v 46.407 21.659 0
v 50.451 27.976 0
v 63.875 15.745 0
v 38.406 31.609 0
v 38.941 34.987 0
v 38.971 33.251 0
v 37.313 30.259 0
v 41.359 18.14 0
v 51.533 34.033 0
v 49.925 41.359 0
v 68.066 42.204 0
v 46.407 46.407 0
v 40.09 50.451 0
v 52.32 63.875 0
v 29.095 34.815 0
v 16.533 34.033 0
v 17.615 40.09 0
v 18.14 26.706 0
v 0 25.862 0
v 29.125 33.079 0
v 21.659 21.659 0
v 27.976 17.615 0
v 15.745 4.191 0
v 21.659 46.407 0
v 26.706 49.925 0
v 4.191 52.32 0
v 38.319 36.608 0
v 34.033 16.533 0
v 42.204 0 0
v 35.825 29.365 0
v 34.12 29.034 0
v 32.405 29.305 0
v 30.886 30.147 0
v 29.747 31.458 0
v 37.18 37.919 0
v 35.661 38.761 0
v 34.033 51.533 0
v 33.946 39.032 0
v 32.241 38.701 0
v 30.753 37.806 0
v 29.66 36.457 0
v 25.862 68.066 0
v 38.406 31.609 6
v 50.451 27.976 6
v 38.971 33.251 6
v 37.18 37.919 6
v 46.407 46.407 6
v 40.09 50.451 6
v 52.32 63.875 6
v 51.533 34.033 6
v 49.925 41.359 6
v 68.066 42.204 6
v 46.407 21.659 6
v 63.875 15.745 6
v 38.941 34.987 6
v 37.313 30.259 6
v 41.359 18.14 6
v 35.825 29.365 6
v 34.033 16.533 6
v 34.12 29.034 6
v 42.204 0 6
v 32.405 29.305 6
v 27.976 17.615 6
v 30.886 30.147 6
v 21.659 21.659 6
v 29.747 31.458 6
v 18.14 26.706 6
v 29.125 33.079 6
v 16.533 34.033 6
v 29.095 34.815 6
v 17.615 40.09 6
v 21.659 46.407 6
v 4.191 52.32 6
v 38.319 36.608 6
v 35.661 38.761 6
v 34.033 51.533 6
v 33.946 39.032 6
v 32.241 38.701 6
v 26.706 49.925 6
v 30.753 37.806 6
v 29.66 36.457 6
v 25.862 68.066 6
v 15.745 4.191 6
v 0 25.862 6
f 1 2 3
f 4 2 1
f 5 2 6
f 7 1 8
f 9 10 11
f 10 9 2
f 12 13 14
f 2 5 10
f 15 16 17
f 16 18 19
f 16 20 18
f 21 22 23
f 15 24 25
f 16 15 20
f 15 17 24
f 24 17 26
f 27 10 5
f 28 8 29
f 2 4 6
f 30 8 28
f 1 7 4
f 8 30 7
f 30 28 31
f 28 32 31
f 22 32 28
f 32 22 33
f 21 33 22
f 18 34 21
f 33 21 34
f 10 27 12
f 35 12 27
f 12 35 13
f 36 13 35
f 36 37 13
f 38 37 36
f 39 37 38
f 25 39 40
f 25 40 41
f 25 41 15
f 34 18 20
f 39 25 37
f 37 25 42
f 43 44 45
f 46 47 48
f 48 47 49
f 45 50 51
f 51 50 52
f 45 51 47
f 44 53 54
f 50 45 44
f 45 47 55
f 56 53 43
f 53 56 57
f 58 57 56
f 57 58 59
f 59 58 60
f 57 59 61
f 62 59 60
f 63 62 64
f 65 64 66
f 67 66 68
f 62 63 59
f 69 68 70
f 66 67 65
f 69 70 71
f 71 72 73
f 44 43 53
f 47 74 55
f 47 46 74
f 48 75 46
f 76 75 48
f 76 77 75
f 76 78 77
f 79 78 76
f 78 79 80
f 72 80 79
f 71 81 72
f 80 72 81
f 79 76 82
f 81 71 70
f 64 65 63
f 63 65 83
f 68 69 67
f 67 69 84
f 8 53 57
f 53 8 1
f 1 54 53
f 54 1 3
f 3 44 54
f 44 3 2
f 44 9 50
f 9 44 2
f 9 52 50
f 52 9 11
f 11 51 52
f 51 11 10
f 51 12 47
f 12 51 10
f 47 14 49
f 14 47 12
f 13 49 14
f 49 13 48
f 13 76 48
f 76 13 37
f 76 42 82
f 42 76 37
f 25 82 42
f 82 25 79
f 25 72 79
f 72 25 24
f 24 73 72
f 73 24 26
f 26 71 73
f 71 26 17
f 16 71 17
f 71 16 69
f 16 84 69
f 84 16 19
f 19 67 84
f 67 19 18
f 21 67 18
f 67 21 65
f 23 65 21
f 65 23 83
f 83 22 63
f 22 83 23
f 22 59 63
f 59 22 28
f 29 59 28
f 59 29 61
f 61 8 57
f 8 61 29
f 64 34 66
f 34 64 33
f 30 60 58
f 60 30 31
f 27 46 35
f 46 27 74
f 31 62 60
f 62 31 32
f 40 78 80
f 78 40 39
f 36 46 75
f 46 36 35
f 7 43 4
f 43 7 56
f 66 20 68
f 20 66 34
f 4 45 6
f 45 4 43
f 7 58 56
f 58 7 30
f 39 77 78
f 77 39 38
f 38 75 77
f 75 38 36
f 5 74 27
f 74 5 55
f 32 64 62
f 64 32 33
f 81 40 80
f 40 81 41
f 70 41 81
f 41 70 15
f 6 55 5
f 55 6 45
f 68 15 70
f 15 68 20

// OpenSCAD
$fn = 32;

// ----------------------------------------------------------------------
// Star wheel: 8-point ratchet, R35
// ----------------------------------------------------------------------

// --- parameters (mm) ---
n_points = 8;             // number of points / teeth
r_out = 35;               // tip radius
r_in = 17.5;              // root radius
bore_r = 5;               // centre bore radius
plate_t = 6;              // plate thickness, Z (extrusion height)
bore_d = 10;              // centre bore diameter

profile = [[34.033, 51.533], [25.862, 68.066], [26.706, 49.925], [21.659, 46.407], [4.191, 52.32], [17.615, 40.09], [16.533, 34.033], [0, 25.862], [18.14, 26.706], [21.659, 21.659], [15.745, 4.191], [27.976, 17.615], [34.033, 16.533], [42.204, 0], [41.359, 18.14], [46.407, 21.659], [63.875, 15.745], [50.451, 27.976], [51.533, 34.033], [68.066, 42.204], [49.925, 41.359], [46.407, 46.407], [52.32, 63.875], [40.09, 50.451]];  // primary outline, 24 points, counter clockwise
void_1 = [[38.941, 34.987], [38.319, 36.608], [37.18, 37.919], [35.661, 38.761], [33.946, 39.032], [32.241, 38.701], [30.753, 37.806], [29.66, 36.457], [29.095, 34.815], [29.125, 33.079], [29.747, 31.458], [30.886, 30.147], [32.405, 29.305], [34.12, 29.034], [35.825, 29.365], [37.313, 30.259], [38.406, 31.609], [38.971, 33.251]];  // centre bore, 18 points

// --- the one profile operation ---
difference() {
  linear_extrude(height = plate_t) polygon(points = profile);
  translate([0, 0, -1])
    linear_extrude(height = plate_t + 2) polygon(points = void_1);
}
